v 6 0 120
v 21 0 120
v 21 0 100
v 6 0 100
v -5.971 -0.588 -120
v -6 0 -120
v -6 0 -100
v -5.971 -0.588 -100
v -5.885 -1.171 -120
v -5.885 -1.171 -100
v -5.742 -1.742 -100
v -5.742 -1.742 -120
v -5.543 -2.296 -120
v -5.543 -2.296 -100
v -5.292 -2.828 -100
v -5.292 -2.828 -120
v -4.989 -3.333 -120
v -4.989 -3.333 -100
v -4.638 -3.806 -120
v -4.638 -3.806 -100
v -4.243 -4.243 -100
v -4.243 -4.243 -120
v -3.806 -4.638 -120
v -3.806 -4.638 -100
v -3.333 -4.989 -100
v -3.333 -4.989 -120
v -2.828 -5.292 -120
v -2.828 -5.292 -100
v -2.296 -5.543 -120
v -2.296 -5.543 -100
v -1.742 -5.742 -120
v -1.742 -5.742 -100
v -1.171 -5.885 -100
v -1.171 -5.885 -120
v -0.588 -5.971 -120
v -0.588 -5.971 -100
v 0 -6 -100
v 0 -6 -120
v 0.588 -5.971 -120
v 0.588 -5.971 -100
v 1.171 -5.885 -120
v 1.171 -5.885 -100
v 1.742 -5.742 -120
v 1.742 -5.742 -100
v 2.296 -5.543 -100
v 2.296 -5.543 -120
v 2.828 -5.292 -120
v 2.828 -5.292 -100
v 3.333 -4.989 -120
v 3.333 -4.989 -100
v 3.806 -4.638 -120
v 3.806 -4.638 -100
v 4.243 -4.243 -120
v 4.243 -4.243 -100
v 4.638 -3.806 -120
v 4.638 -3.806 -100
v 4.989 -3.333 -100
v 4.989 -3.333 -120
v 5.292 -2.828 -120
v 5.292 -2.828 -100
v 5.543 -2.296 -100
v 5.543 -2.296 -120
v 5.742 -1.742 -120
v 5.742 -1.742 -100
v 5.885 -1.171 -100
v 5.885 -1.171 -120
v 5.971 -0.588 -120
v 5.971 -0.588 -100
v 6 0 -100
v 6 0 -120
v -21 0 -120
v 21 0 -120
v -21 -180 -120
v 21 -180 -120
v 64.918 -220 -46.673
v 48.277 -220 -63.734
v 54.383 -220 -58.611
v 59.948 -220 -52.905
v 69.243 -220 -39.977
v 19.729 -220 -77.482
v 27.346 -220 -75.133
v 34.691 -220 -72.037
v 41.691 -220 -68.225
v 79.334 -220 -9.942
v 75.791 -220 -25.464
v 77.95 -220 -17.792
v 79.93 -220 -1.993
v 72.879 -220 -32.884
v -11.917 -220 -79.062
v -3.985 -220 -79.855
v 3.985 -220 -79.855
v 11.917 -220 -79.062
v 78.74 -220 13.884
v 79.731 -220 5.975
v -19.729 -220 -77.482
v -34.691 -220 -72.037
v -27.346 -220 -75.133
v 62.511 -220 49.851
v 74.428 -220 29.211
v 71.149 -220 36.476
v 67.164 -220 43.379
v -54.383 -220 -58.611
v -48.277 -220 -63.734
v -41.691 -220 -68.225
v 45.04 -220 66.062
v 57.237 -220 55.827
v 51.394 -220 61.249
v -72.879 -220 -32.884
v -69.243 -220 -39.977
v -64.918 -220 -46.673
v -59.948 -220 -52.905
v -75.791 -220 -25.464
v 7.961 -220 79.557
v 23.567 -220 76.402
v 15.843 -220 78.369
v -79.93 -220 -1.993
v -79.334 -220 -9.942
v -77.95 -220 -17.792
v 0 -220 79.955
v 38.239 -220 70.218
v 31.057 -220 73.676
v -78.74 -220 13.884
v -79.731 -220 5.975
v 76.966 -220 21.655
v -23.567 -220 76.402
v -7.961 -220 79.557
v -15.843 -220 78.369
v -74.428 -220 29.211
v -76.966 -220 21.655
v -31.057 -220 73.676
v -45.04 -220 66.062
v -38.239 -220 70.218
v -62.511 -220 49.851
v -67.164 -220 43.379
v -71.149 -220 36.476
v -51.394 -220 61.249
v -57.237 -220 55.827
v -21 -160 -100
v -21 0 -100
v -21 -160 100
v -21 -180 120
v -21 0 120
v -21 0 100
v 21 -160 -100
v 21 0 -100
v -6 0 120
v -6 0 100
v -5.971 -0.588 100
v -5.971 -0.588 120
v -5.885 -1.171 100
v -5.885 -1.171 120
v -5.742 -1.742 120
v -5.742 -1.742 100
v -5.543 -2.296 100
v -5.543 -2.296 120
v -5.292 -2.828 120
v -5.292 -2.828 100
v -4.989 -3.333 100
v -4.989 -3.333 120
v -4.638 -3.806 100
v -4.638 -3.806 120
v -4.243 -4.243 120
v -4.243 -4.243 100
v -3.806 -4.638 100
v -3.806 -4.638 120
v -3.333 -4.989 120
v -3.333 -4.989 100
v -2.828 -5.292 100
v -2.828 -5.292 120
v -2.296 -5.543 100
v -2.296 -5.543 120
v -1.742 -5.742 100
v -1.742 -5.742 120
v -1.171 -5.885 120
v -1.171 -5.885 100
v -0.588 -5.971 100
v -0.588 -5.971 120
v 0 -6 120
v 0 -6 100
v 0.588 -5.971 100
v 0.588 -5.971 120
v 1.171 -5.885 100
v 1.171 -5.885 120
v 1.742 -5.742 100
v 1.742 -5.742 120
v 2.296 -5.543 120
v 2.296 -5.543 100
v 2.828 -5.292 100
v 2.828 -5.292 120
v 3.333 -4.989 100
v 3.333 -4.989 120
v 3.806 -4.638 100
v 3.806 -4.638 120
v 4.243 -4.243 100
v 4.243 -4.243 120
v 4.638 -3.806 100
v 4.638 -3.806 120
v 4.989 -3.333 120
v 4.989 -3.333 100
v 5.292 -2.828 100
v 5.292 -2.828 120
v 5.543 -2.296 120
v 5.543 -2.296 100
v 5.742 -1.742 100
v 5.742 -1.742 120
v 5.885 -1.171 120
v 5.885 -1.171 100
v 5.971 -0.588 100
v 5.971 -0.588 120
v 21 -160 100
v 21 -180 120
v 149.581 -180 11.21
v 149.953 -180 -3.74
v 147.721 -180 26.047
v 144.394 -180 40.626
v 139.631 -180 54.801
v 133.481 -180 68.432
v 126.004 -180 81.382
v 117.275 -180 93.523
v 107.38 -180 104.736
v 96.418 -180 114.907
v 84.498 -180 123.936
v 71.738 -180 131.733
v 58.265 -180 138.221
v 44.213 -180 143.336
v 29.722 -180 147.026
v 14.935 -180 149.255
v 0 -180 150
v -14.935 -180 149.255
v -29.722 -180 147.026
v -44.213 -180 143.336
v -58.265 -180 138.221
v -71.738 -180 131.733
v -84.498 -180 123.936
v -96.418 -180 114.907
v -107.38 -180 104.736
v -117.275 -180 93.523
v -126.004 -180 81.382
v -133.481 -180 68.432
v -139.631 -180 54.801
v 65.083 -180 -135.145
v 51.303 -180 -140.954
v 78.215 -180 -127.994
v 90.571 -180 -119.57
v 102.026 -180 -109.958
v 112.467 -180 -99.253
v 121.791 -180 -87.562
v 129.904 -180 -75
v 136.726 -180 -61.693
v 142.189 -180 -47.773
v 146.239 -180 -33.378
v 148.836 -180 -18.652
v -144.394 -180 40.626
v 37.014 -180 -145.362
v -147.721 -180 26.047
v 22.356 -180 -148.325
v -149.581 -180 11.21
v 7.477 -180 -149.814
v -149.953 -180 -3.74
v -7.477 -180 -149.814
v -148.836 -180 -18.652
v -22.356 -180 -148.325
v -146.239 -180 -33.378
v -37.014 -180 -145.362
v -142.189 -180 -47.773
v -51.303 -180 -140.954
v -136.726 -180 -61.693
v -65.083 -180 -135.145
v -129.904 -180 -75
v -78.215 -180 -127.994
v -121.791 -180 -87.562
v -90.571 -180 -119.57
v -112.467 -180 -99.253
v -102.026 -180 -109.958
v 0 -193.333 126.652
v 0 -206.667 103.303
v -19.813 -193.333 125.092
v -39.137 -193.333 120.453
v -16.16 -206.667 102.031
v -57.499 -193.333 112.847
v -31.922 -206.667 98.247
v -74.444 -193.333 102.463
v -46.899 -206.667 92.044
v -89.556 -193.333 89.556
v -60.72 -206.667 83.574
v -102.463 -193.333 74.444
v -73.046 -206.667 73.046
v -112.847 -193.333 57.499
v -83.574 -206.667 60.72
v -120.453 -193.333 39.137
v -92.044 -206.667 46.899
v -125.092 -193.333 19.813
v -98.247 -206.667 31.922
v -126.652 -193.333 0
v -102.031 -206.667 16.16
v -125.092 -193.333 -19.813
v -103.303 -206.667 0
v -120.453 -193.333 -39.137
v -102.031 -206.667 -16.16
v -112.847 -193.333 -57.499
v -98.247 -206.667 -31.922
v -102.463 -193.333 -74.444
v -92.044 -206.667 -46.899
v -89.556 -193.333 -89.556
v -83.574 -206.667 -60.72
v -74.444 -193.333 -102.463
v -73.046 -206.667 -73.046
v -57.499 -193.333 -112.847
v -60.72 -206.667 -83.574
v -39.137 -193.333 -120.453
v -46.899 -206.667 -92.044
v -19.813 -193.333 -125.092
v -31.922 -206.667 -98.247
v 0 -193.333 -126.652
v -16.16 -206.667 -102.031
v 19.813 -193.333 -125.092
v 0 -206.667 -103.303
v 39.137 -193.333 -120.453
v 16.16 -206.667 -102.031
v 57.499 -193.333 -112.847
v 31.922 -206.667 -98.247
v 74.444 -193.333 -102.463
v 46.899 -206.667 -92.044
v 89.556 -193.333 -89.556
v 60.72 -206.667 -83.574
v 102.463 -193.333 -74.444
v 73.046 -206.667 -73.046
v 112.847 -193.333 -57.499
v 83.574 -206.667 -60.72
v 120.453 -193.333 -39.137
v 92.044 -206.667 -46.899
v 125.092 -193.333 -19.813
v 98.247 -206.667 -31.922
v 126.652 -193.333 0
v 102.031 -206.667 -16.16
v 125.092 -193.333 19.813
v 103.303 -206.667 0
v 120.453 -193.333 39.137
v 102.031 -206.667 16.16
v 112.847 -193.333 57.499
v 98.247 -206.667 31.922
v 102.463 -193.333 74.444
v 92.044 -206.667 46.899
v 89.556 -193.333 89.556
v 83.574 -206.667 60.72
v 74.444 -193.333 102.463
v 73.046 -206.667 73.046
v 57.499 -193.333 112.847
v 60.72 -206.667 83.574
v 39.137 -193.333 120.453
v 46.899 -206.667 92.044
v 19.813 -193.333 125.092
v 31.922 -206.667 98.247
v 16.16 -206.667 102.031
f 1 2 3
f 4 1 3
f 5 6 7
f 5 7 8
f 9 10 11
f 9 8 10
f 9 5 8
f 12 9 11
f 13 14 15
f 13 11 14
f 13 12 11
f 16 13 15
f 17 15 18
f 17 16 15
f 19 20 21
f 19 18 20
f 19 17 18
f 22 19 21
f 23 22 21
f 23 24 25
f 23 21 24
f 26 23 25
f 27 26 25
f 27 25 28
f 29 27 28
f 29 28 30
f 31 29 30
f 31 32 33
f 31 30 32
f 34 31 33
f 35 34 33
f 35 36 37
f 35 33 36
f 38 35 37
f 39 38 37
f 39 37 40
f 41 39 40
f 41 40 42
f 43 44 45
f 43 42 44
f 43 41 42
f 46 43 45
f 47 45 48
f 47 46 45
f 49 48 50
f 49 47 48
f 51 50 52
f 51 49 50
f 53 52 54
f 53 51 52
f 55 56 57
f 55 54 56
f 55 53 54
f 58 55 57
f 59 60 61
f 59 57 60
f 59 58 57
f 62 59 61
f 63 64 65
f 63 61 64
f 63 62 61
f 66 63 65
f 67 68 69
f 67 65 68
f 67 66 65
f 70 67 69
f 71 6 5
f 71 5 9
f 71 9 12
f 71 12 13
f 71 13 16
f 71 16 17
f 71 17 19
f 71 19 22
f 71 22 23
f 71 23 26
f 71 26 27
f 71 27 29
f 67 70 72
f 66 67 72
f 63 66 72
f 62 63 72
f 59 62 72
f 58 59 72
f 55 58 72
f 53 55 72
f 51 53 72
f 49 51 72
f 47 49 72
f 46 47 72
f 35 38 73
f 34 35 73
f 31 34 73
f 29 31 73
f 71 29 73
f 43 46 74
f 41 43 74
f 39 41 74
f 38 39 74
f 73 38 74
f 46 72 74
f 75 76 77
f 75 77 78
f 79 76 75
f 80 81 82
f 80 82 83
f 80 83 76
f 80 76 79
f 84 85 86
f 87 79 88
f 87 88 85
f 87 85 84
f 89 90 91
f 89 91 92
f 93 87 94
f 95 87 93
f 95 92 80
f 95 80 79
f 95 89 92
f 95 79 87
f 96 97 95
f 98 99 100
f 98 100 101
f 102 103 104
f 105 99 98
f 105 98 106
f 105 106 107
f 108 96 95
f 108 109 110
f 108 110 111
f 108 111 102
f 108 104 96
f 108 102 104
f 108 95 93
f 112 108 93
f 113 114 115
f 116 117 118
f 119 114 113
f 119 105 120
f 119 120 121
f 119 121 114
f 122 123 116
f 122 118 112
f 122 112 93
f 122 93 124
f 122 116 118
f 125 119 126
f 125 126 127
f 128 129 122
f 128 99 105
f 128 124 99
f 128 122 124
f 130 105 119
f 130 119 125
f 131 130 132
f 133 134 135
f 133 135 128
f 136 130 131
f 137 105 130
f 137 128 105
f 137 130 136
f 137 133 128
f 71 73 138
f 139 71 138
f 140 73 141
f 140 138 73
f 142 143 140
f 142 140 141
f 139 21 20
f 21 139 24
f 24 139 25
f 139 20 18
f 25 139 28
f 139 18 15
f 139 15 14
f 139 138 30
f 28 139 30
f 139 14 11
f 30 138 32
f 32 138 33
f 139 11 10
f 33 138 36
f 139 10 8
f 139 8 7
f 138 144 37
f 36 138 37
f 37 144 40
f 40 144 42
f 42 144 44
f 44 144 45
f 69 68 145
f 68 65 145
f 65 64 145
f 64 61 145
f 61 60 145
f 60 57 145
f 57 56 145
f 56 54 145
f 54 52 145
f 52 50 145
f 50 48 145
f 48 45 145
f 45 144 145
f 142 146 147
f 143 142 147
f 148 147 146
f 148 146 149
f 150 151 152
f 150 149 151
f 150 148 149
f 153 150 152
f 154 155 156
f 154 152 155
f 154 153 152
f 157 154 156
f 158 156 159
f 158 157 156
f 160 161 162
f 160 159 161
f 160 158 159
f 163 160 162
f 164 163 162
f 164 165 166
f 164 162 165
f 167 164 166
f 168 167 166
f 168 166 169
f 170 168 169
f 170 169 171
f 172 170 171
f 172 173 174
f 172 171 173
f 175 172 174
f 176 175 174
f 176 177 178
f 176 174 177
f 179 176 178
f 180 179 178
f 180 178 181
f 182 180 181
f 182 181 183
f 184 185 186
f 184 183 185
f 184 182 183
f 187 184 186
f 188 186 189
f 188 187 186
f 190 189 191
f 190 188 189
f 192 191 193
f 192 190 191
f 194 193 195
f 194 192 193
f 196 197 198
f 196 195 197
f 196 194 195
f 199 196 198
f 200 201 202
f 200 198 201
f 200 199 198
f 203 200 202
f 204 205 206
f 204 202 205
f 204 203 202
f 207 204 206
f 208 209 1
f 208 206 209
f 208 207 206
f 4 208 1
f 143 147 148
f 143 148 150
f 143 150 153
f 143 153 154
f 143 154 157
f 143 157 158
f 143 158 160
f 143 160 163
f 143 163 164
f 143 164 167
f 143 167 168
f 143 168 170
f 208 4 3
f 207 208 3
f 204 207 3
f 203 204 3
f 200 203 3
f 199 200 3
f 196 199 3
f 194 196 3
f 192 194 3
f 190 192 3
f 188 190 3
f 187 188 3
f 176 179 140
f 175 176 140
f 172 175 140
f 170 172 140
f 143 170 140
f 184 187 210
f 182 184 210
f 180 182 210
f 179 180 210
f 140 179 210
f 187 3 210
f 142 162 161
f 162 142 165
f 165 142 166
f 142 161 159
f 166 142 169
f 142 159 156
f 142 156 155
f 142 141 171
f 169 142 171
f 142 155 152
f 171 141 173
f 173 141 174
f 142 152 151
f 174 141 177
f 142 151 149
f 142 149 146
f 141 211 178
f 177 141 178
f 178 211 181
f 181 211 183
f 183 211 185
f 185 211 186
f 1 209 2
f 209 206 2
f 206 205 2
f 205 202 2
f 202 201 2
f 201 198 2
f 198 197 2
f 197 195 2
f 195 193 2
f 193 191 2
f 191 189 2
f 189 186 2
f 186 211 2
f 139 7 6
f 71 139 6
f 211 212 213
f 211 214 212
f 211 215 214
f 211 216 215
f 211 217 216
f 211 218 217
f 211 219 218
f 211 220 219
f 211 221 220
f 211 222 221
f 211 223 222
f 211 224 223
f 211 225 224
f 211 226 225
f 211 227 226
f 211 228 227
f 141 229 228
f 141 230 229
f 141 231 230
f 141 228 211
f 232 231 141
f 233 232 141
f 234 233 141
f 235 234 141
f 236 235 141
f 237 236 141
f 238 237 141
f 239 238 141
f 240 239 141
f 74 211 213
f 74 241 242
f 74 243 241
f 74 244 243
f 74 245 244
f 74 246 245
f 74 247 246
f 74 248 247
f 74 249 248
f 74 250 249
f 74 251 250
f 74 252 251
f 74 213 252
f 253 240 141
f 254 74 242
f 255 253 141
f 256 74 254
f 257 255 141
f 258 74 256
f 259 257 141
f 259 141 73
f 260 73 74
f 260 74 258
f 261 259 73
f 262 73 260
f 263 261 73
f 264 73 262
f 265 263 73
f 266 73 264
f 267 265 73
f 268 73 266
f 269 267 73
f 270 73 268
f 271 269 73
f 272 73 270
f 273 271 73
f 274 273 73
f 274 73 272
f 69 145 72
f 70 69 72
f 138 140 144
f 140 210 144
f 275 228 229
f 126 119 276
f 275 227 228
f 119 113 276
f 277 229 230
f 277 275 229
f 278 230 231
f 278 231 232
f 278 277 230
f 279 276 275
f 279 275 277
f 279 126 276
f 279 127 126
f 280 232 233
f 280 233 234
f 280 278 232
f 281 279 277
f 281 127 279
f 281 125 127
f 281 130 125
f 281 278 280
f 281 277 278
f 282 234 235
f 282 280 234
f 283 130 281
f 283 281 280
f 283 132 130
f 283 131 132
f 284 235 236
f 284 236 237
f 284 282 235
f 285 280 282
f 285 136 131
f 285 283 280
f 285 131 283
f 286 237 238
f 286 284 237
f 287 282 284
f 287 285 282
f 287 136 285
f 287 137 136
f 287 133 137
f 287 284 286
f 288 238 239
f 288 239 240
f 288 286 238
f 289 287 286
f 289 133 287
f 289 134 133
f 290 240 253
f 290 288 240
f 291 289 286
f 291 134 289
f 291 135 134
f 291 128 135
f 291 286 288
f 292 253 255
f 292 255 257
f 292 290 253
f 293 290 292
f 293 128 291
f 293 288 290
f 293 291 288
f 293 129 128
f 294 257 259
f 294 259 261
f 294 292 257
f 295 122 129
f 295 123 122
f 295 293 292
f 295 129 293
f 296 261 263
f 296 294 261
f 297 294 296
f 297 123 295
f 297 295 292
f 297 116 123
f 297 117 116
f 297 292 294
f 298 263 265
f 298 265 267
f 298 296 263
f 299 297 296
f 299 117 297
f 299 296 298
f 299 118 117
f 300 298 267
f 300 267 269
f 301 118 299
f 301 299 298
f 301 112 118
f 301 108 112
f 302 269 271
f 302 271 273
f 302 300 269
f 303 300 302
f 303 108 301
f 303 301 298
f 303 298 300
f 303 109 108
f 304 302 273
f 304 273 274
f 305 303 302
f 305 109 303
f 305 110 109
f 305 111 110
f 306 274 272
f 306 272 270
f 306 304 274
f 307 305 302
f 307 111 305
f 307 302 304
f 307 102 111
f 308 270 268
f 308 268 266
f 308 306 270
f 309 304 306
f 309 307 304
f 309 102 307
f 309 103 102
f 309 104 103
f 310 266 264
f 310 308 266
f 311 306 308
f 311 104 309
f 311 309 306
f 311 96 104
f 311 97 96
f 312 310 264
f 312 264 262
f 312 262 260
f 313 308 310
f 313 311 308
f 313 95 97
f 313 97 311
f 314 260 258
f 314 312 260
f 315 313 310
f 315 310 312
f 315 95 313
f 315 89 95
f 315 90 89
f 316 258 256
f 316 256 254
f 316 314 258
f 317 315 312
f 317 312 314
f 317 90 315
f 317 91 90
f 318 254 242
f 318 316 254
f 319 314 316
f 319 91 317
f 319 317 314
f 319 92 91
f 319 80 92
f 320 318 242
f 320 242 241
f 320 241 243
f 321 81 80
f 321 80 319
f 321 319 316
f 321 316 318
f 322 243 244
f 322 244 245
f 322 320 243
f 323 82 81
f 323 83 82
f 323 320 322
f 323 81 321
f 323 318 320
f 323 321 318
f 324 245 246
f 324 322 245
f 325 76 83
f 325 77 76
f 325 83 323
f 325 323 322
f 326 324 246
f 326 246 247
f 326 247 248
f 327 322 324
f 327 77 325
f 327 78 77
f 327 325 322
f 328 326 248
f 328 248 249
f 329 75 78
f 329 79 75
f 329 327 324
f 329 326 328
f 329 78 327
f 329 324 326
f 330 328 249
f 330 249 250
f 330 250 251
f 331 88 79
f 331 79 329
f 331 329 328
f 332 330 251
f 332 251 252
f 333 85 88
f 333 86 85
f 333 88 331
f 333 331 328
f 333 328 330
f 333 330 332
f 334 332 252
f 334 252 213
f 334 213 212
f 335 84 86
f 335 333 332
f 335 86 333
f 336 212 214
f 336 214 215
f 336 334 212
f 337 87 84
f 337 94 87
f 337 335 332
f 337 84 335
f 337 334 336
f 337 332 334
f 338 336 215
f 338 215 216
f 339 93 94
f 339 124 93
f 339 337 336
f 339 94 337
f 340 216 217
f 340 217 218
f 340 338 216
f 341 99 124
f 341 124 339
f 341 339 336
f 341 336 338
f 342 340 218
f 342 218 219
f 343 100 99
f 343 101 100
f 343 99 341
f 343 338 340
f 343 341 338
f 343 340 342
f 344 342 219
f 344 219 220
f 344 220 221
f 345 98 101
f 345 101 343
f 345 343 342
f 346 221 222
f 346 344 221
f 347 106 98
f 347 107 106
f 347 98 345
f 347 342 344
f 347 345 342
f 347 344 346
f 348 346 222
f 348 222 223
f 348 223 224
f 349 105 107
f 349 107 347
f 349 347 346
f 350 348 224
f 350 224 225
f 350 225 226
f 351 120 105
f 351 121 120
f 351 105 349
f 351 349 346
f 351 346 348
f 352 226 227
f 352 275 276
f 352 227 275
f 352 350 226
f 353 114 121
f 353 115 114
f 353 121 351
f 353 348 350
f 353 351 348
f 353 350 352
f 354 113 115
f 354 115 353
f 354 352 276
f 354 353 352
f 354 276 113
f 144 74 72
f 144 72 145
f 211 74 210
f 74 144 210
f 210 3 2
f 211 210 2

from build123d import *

# Parameters (mm, degrees)
BOSS_EXTRUDE1_DEPTH     = 21
CUT_EXTRUDE1_DEPTH      = 306.614135799
CUT_EXTRUDE1_DEPTH_BACK = 306.614135799
SKETCH3_R               = 6


with BuildPart() as part:
    # Sketch1 → Boss-Extrude1 (new, symmetric)
    with BuildSketch(Plane(origin=(0, 0, 0), x_dir=(0, 0, -1), z_dir=(1, 0, 0))):
        Polygon((-120, 0), (-100, 0), (-100, -160), (100, -160), (100, 0), (120, 0), (120, -180), (-120, -180), align=None)
    extrude(amount=BOSS_EXTRUDE1_DEPTH, both=True)

    # Sketch2 → Revolve1 (revolve)
    with BuildSketch(Plane.XY, mode=Mode.PRIVATE) as revolve1_sk:
        Polygon((0, -180), (150, -180), (79.954646314, -220), (0, -220), align=None)
    revolve(revolve1_sk.sketch.rotate(Axis((0, 87.726376394, 0), (0, -1, 0)), 90), axis=Axis((0, 87.726376394, 0), (0, -1, 0)))

    # Sketch3 → Cut-Extrude1 (cut, two sides: drawn at the far end of the back side and taken through both)
    with BuildSketch(Plane.XY.offset(-CUT_EXTRUDE1_DEPTH_BACK)):
        Circle(SKETCH3_R)
    extrude(amount=CUT_EXTRUDE1_DEPTH + CUT_EXTRUDE1_DEPTH_BACK, mode=Mode.SUBTRACT)


solid = part.part
